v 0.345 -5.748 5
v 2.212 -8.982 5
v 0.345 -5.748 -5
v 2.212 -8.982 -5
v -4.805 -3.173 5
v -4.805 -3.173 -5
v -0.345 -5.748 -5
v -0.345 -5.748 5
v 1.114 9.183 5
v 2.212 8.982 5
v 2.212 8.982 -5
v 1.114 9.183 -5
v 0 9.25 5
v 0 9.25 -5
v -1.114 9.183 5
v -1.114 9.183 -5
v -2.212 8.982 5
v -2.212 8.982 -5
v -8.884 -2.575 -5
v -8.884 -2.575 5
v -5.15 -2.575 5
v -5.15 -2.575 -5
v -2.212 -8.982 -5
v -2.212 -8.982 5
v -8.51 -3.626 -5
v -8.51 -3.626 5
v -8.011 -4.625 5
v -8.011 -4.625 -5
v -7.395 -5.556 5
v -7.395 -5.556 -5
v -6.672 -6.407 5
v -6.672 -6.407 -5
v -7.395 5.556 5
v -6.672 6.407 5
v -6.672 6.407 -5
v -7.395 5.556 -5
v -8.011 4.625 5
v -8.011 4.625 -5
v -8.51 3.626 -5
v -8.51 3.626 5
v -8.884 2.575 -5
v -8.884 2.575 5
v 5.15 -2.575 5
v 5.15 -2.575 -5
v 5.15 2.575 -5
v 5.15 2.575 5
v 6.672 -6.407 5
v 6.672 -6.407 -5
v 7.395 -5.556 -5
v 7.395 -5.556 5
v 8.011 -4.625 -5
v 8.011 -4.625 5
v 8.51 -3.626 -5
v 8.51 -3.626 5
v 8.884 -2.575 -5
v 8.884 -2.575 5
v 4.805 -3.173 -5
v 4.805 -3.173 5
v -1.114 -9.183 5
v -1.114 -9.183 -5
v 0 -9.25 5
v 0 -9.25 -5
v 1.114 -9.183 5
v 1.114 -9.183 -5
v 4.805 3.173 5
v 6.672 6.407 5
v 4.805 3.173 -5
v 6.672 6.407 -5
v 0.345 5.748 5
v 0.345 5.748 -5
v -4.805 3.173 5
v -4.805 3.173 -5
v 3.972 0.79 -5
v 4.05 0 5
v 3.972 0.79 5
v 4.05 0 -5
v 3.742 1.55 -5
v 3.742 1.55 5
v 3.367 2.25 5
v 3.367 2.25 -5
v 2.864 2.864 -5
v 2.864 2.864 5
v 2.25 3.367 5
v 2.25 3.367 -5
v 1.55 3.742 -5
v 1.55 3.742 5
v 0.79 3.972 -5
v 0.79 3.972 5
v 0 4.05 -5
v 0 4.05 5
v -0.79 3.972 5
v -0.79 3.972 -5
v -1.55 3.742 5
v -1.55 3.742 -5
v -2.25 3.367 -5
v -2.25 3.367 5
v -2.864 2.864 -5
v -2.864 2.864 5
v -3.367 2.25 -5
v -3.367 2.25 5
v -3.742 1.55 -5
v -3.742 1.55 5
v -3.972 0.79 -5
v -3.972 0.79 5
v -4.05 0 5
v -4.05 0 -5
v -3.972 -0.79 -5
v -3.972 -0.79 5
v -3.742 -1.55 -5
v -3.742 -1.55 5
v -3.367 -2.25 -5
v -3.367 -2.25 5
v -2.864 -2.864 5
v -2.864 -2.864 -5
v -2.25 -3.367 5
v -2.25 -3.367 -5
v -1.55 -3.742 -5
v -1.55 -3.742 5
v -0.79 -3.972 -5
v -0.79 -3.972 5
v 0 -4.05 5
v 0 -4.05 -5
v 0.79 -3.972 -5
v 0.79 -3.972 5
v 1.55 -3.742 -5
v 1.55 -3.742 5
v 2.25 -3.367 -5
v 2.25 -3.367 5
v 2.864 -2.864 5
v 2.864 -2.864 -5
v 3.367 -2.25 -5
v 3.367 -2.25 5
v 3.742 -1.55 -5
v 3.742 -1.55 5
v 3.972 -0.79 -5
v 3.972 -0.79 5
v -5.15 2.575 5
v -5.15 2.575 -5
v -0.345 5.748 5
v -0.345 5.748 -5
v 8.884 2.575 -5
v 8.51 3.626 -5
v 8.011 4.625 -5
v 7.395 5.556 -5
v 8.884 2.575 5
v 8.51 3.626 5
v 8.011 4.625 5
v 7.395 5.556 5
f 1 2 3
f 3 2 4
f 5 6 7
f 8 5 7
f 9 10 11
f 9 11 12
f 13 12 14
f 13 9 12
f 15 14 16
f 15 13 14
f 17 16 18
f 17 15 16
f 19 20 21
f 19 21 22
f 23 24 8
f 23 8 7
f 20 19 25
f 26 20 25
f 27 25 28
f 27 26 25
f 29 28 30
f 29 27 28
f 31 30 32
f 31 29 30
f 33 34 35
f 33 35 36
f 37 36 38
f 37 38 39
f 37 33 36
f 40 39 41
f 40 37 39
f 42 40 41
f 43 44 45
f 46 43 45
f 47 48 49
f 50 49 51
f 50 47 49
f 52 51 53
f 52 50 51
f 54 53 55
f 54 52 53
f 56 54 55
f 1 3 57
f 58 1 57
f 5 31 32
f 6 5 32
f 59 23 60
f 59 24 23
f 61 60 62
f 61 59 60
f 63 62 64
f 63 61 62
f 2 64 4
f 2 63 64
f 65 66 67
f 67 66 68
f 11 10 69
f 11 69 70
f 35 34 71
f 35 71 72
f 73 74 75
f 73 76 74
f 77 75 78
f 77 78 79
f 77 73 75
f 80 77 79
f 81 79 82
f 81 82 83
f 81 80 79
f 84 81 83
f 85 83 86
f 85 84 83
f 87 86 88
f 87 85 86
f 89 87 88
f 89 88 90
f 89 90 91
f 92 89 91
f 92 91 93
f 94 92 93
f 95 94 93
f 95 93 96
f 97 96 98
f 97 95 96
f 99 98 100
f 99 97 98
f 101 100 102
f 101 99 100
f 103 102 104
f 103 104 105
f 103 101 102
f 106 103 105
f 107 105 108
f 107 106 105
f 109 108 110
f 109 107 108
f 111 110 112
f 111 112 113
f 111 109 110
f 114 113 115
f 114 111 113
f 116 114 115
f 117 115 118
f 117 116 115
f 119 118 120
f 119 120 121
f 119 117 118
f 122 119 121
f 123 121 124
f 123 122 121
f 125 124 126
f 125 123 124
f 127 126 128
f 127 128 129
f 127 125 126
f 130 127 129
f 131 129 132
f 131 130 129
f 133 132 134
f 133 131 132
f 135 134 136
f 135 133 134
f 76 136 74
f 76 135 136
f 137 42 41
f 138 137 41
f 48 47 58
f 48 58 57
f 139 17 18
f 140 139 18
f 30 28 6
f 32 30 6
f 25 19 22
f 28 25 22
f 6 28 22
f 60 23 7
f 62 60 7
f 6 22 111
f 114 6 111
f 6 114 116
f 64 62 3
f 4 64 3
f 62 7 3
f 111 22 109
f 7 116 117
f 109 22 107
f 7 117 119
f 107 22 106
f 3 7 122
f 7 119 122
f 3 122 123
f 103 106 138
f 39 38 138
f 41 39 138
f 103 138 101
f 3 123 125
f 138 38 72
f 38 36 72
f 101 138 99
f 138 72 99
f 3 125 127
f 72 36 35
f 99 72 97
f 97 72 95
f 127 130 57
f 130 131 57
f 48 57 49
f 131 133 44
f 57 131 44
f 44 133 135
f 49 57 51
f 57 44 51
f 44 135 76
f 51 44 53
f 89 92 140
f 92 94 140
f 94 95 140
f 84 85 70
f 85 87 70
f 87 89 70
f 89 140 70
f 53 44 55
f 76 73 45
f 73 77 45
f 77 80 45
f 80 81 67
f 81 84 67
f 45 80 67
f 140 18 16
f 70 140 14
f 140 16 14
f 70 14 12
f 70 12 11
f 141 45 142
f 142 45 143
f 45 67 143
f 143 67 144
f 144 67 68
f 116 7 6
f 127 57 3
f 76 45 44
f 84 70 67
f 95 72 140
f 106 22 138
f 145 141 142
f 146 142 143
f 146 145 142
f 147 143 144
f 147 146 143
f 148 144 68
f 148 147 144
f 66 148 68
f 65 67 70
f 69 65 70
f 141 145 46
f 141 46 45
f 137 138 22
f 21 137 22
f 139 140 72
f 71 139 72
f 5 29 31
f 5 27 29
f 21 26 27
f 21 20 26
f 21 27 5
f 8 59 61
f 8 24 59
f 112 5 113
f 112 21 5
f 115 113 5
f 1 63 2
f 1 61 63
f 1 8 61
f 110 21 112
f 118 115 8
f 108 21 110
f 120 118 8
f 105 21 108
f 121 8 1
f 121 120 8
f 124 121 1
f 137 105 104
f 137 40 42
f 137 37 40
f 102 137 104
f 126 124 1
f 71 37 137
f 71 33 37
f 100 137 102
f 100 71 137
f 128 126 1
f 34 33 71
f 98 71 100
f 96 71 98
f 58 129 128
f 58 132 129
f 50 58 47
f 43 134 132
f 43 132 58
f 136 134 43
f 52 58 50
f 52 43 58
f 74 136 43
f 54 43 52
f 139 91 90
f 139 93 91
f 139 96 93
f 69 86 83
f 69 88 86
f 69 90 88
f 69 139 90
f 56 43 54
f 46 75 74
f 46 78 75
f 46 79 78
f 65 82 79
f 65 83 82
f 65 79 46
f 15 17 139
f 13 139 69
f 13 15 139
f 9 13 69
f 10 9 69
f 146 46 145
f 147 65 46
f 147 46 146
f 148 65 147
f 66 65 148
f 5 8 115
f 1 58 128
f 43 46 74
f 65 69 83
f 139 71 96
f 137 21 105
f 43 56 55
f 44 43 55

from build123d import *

# Parameters (mm, degrees)
SKETCH1_R           = 9.25
SKETCH1_R_2         = 4.05
BOSS_EXTRUDE1_DEPTH = 5
SKETCH2_W           = 5.15
SKETCH2_H           = 10
CUT_EXTRUDE3_DEPTH  = 4.1
CIRPATTERN1_COUNT   = 6


with BuildPart() as part:
    # Sketch1 → Boss-Extrude1 (new, symmetric)
    with BuildSketch(Plane.XY):
        Circle(SKETCH1_R)
        Circle(SKETCH1_R_2, mode=Mode.SUBTRACT)
    extrude(amount=BOSS_EXTRUDE1_DEPTH, both=True)

    # Sketch2 → Cut-Extrude3 (cut)
    with BuildSketch(Plane(origin=(-9.25, -17.193061184, 0), x_dir=(0, -1, 0), z_dir=(1, 0, 0))):
        with Locations((-17.193061184, 0)):
            Rectangle(SKETCH2_W, SKETCH2_H)
    cut_extrude3 = extrude(amount=CUT_EXTRUDE3_DEPTH, mode=Mode.SUBTRACT)

    # CirPattern1: Cut-Extrude3 ×6 about axis
    cirpattern1_axis = Axis((0, 0, 5), (0, 0, 1))
    for i in range(1, CIRPATTERN1_COUNT):
        add(cut_extrude3.rotate(cirpattern1_axis, i * 360 / CIRPATTERN1_COUNT), mode=Mode.SUBTRACT)


solid = part.part
